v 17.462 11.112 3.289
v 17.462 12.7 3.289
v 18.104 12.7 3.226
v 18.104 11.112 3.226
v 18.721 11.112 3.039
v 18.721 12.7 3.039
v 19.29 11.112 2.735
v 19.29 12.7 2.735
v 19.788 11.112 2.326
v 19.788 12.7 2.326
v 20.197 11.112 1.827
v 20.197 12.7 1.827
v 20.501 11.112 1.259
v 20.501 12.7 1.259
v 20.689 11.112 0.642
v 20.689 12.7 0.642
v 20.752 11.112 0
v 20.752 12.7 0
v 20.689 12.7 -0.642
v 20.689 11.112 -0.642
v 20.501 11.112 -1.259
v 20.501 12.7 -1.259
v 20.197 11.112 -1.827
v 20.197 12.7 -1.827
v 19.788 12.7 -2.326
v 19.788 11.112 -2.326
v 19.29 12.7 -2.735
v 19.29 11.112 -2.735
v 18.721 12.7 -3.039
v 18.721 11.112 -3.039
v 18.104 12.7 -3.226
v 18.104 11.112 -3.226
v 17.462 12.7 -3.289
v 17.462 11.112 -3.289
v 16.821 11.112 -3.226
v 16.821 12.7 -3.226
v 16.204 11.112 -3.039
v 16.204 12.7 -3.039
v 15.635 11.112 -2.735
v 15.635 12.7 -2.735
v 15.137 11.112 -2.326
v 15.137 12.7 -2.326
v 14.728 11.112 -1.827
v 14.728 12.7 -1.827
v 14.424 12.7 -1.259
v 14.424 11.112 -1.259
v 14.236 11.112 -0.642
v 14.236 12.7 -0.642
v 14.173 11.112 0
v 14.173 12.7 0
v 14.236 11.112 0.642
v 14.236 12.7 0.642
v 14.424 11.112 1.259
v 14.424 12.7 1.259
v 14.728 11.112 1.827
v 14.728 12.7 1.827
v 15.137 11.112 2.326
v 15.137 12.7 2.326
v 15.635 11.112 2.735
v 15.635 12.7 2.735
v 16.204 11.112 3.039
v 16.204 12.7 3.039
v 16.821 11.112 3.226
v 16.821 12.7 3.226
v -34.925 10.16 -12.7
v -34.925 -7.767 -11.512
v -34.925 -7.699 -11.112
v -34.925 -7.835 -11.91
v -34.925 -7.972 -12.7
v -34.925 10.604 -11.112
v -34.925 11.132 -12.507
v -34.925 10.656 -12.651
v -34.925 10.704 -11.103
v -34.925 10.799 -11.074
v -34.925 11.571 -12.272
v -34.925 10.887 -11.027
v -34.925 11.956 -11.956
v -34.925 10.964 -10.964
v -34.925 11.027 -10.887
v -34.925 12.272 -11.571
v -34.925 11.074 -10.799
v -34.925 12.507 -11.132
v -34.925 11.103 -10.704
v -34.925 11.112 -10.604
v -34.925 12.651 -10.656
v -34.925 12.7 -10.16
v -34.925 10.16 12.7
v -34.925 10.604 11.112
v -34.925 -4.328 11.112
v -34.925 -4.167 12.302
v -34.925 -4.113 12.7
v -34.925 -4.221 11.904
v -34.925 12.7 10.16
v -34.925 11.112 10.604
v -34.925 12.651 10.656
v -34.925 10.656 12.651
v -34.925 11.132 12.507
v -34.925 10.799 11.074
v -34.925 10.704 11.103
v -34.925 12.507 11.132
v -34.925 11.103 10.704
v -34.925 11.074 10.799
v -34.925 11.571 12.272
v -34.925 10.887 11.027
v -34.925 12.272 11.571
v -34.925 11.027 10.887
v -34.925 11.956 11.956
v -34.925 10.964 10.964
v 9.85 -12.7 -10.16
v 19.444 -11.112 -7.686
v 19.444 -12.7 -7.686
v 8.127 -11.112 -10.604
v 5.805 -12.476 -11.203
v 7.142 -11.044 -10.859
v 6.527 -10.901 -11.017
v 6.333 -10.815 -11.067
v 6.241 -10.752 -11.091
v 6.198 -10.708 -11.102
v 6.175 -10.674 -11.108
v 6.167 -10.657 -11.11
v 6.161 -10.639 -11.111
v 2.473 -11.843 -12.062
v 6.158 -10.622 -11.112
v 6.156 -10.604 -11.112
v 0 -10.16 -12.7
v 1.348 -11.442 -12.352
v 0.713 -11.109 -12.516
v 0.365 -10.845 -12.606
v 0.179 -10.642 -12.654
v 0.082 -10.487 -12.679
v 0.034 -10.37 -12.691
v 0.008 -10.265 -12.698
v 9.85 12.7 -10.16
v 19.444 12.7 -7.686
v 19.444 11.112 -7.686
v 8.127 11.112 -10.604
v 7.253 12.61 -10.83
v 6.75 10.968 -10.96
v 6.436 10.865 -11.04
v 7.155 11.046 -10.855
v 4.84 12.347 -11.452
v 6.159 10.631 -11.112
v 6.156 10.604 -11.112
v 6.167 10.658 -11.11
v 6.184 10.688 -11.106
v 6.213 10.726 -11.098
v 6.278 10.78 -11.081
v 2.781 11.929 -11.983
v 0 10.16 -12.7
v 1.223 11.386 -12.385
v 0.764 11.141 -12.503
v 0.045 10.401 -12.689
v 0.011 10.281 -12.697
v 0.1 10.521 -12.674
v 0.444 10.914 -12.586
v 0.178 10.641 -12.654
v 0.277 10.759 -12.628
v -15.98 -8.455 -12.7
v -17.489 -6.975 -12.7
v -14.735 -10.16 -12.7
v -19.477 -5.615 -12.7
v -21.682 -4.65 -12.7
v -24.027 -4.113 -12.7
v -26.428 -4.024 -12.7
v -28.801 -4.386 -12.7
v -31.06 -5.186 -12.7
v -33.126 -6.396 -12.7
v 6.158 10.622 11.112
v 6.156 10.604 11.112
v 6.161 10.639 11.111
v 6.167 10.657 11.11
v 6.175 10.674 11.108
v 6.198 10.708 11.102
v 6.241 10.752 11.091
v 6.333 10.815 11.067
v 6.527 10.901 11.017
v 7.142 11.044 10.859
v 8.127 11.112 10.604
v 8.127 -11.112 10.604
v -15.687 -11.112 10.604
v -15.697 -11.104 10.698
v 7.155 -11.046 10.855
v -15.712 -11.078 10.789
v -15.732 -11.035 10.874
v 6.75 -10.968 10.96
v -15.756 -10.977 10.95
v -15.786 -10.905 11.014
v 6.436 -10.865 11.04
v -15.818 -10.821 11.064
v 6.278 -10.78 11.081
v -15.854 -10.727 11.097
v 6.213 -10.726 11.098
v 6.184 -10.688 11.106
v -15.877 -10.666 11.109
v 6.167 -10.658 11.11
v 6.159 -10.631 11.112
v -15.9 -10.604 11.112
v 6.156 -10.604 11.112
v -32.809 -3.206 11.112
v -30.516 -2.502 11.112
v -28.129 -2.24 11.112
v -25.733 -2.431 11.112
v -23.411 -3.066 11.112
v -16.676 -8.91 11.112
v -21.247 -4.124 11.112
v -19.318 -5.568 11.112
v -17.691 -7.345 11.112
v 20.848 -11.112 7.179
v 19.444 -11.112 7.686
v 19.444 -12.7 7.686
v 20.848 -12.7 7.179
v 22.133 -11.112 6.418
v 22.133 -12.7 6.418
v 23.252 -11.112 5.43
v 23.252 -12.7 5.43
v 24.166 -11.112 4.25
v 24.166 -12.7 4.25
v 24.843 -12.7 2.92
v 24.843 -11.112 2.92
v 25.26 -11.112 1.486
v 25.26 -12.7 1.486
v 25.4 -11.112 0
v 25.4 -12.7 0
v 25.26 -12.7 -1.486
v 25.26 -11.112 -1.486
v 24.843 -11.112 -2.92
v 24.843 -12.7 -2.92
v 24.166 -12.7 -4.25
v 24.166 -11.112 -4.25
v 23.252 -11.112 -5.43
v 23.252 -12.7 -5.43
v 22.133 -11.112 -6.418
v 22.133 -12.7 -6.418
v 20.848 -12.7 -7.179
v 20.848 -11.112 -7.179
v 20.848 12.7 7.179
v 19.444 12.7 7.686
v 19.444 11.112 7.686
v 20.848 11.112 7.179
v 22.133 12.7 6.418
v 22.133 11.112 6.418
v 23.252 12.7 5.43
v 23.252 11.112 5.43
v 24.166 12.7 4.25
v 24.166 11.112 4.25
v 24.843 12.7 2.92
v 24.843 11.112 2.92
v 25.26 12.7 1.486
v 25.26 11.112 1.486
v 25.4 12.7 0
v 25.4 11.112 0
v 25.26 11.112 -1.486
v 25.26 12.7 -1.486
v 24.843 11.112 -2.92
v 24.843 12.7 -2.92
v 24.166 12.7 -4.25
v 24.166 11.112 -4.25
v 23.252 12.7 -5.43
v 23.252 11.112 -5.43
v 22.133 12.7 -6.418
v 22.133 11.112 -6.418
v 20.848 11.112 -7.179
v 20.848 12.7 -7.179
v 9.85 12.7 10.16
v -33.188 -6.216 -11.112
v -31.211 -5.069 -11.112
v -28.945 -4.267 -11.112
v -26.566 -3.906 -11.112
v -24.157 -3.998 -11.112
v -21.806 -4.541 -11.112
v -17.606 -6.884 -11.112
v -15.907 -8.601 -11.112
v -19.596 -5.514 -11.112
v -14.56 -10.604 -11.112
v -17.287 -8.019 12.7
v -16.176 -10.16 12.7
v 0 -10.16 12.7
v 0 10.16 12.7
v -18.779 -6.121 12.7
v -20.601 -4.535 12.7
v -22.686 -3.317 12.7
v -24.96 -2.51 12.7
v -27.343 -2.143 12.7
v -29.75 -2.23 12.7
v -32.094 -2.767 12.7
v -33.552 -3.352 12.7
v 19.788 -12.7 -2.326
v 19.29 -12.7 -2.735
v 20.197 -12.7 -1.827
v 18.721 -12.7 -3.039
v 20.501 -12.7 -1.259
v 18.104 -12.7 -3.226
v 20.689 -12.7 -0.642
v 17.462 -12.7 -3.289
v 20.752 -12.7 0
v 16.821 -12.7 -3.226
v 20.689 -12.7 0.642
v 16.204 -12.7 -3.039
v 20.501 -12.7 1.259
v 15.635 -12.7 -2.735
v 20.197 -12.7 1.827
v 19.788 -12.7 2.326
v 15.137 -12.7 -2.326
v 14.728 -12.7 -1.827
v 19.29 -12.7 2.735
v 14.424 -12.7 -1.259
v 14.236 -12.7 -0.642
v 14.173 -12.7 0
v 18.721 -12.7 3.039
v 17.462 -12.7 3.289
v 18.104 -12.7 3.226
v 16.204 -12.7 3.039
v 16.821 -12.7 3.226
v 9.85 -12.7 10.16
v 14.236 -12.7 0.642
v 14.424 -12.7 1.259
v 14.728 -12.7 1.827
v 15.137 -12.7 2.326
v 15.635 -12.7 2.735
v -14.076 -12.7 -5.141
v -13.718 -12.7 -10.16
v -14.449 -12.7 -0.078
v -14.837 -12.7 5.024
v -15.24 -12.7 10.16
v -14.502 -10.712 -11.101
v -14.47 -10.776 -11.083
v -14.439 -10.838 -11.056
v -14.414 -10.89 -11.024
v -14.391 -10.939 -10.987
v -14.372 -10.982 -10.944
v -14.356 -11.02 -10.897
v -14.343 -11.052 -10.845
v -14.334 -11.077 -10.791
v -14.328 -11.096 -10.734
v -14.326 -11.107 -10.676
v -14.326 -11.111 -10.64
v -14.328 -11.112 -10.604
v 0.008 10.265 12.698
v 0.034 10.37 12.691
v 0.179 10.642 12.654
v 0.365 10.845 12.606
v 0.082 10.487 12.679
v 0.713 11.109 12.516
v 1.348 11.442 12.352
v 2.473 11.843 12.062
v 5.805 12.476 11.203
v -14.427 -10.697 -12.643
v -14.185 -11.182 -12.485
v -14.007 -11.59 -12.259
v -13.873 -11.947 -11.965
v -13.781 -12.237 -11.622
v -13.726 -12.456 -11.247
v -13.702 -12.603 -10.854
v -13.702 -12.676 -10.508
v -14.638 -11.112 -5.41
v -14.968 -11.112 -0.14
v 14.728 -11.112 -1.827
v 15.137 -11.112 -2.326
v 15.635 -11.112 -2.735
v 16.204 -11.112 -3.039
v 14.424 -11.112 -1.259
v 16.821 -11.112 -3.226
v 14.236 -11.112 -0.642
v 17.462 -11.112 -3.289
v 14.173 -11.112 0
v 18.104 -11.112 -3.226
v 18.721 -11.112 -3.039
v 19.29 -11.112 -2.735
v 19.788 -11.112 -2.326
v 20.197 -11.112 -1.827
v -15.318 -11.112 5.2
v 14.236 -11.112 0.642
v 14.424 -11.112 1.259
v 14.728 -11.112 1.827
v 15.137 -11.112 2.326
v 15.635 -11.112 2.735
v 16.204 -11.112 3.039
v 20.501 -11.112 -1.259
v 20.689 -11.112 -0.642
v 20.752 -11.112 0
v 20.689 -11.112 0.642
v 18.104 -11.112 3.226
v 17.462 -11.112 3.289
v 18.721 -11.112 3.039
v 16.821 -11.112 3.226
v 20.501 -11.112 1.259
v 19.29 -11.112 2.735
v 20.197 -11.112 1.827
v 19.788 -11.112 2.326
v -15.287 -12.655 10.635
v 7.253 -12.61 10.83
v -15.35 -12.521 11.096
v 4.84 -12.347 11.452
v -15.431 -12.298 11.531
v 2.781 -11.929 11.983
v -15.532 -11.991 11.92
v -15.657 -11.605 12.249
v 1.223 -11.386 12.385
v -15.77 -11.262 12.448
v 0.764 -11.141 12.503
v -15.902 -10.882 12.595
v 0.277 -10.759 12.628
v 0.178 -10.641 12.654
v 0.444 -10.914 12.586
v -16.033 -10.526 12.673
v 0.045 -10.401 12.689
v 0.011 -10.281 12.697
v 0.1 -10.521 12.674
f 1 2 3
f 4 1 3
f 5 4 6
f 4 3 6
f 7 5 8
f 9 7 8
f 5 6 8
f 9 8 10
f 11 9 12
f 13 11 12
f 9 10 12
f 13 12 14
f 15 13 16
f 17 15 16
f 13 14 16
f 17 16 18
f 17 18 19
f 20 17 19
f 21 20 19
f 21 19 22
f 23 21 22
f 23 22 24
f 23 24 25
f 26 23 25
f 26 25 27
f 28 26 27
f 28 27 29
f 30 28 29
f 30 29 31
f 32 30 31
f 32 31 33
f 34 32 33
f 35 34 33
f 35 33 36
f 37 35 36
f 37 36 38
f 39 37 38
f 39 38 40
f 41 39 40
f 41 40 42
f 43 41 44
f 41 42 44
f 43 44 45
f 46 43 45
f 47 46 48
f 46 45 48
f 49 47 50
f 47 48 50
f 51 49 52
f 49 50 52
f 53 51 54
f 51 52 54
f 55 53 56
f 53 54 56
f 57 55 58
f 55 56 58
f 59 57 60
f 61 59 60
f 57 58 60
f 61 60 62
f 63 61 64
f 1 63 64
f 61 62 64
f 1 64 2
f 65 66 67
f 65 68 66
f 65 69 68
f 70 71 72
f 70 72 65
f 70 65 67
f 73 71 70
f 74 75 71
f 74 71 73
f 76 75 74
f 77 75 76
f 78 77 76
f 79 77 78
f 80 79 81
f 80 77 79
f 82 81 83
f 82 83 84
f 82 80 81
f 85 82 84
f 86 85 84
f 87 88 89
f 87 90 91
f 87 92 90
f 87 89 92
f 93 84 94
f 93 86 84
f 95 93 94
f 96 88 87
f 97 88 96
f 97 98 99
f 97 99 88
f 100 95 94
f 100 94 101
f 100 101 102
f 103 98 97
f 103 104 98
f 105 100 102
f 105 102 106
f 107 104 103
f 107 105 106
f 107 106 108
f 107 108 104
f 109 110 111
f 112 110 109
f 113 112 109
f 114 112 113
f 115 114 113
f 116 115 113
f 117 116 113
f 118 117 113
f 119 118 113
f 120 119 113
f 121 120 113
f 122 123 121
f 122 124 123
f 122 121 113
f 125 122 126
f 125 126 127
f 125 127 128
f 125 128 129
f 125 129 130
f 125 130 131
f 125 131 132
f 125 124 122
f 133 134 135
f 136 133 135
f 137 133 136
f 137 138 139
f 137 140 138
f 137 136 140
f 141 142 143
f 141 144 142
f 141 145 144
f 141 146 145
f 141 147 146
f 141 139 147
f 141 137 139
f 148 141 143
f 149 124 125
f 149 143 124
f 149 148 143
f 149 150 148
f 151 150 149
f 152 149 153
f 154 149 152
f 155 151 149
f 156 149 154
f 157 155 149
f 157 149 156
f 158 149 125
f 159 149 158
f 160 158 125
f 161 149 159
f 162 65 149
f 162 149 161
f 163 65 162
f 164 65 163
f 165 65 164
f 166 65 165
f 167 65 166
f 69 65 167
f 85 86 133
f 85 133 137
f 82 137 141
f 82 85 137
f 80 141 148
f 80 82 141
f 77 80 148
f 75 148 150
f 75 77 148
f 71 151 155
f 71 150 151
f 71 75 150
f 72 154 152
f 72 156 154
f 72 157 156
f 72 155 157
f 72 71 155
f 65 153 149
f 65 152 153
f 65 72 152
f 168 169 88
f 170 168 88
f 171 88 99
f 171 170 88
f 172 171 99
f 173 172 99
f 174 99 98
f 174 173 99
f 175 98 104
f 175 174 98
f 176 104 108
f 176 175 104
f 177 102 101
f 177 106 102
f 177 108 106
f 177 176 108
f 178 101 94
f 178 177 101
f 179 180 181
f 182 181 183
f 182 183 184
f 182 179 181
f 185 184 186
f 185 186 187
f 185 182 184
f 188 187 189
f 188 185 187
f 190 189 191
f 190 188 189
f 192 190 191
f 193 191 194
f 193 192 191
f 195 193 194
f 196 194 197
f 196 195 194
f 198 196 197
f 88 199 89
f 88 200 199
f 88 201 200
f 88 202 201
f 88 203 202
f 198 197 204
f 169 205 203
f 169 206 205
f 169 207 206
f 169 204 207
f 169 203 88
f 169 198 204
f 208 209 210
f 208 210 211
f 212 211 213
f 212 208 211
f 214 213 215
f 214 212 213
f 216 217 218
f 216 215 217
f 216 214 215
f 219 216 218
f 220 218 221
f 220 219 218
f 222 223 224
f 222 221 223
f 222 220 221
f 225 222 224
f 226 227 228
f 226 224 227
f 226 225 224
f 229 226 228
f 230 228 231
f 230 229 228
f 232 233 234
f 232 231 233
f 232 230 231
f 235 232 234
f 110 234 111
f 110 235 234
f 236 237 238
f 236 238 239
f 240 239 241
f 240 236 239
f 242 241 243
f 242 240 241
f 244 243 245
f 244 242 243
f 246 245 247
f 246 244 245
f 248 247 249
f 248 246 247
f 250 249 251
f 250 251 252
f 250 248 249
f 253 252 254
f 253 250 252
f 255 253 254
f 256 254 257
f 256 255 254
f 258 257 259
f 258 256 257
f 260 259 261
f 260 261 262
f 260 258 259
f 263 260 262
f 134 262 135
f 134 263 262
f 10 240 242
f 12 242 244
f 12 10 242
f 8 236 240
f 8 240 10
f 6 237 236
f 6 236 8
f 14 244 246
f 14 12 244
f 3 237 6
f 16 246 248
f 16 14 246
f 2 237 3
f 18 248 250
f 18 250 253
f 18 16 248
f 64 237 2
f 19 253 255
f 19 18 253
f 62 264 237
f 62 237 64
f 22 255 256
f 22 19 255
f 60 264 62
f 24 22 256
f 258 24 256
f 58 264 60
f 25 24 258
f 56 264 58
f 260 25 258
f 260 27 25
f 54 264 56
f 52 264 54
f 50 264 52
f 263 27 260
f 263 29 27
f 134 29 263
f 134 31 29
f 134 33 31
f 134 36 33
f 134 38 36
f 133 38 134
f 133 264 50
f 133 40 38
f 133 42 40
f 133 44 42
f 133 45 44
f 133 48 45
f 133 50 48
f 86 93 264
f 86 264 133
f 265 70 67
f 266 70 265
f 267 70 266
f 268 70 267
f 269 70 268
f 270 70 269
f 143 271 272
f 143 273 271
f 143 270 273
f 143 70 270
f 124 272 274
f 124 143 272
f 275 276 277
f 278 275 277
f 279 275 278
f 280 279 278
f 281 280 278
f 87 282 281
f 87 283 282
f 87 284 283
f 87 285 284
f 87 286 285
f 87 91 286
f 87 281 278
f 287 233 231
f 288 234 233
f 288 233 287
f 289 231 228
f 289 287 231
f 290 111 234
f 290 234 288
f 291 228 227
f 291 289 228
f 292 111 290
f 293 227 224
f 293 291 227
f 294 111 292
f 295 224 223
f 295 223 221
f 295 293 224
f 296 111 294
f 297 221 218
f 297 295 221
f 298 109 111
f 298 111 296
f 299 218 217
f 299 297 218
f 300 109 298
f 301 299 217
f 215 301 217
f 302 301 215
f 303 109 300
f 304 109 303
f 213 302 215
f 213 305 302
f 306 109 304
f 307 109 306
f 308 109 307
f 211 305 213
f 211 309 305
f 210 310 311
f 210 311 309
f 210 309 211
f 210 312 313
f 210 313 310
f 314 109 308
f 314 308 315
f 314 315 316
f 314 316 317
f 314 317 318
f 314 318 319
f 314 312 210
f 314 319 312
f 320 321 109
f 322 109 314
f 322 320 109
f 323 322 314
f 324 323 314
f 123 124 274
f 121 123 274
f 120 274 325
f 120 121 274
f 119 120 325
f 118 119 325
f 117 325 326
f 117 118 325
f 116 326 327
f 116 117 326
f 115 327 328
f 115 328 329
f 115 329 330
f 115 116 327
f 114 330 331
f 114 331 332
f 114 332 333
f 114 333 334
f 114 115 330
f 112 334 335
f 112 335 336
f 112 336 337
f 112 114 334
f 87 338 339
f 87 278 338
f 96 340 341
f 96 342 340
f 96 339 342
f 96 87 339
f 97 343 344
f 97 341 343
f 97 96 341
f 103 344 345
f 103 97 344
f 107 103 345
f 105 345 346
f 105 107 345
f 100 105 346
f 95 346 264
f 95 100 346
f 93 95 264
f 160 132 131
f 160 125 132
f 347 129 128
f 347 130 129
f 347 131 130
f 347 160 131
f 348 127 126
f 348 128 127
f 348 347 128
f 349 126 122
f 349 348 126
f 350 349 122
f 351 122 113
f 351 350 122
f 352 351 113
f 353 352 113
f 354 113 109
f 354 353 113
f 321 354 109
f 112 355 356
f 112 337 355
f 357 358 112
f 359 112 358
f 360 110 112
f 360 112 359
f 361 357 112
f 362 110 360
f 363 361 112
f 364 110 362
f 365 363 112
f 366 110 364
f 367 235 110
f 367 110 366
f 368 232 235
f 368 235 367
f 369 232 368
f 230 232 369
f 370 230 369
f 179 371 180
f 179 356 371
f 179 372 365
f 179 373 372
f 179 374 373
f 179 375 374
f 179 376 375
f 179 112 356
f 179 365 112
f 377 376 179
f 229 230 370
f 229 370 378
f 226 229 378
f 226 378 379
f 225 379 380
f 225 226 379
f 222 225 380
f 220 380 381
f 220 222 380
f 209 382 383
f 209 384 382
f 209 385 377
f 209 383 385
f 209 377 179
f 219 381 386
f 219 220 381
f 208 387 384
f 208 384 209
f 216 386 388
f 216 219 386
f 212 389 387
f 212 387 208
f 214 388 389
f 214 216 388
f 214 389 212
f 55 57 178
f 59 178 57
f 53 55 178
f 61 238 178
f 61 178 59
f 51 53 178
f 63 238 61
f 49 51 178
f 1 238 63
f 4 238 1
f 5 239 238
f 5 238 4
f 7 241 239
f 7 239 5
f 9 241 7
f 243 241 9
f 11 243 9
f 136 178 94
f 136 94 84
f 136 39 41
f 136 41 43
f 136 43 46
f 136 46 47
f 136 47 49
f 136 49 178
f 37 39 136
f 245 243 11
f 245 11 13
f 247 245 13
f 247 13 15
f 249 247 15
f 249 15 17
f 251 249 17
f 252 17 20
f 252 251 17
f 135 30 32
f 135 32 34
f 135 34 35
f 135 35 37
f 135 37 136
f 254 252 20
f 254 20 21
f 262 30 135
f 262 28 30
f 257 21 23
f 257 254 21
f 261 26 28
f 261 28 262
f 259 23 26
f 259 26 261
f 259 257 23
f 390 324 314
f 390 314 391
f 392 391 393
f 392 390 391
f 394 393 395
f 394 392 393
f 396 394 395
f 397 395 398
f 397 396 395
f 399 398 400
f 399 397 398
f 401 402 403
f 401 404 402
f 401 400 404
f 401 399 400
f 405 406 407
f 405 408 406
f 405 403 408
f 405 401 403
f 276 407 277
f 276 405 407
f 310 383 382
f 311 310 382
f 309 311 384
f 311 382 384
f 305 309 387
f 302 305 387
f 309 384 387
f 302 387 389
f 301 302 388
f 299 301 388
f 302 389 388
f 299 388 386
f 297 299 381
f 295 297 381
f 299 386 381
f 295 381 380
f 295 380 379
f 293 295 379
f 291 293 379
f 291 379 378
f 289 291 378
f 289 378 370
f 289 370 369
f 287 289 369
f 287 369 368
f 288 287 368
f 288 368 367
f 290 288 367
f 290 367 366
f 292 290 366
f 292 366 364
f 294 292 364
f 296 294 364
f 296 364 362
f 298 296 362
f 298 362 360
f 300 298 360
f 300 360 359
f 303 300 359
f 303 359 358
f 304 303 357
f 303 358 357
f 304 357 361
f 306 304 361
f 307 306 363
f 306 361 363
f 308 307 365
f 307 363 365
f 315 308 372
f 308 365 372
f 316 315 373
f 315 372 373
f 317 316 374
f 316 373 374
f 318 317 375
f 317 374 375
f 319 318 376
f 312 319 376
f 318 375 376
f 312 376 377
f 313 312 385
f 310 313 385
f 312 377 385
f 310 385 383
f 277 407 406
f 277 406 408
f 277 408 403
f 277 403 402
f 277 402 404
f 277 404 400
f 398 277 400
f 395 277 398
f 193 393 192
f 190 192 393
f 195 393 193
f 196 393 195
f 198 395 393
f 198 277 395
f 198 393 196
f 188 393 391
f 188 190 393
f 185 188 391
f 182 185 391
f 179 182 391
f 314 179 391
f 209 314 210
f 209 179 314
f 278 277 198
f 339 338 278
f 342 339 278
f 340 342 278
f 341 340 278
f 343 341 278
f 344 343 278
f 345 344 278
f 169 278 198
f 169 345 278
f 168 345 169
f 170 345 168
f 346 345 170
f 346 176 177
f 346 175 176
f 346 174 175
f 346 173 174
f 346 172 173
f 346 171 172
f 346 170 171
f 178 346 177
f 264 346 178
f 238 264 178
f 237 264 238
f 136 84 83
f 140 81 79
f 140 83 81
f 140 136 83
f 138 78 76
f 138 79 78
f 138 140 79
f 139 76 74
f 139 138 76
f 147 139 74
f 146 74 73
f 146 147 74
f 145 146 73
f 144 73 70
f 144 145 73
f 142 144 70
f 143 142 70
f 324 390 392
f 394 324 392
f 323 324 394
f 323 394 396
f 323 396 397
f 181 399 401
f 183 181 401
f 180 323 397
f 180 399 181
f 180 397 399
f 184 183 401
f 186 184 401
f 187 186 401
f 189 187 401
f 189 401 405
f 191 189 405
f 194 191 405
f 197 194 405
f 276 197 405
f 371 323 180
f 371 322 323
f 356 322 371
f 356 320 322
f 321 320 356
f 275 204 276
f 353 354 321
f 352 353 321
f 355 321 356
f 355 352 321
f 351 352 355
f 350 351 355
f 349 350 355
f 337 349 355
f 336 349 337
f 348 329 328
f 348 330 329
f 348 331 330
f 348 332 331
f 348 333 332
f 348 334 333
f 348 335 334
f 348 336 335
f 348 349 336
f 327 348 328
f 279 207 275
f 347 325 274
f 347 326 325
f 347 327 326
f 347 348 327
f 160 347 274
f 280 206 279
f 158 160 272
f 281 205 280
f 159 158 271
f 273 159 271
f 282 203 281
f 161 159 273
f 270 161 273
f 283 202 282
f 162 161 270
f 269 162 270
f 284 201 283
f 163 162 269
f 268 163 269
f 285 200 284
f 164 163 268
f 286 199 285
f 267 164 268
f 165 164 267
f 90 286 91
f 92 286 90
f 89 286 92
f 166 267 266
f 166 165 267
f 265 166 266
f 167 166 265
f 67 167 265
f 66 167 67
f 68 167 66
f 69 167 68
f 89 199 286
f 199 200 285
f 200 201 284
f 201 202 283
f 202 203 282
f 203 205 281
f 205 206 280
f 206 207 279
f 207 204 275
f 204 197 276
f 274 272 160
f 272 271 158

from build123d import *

# Parameters (mm, degrees)
BOSS_EXTRUDE1_DEPTH      = 25.4
BOSS_EXTRUDE1_DEPTH_BACK = 34.925
CUT_EXTRUDE4_DEPTH       = 63.941922635
CUT_EXTRUDE5_DEPTH       = 46.01339384
SKETCH14_R               = 3.2893
CUT_EXTRUDE6_DEPTH       = 46.01339384
CUT_EXTRUDE7_DEPTH       = 12.7
CUT_EXTRUDE7_DEPTH_BACK  = 38.1
SKETCH15_R               = 12.7


with BuildPart() as part:
    # Sketch1 → Boss-Extrude1 (new, two sides: drawn at the far end of the back side and taken through both)
    with BuildSketch(Plane(origin=(0, 0, 0), x_dir=(0, 0, -1), z_dir=(1, 0, 0)).offset(-BOSS_EXTRUDE1_DEPTH_BACK)):
        with BuildLine():
            Line((-10.16, 12.7), (10.16, 12.7))
            ThreePointArc((10.16, 12.7), (11.956051224, 11.956051224), (12.7, 10.16))
            Line((12.7, 10.16), (12.7, -10.16))
            ThreePointArc((12.7, -10.16), (11.956051224, -11.956051224), (10.16, -12.7))
            Line((10.16, -12.7), (-10.16, -12.7))
            ThreePointArc((-10.16, -12.7), (-11.956051224, -11.956051224), (-12.7, -10.16))
            Line((-12.7, -10.16), (-12.7, 10.16))
            ThreePointArc((-12.7, 10.16), (-11.956051224, 11.956051224), (-10.16, 12.7))
        make_face()
    extrude(amount=BOSS_EXTRUDE1_DEPTH + BOSS_EXTRUDE1_DEPTH_BACK)

    # Sketch11 → Cut-Extrude4 (cut, through all)
    with BuildSketch(Plane(origin=(25.4, 0, 0), x_dir=(0, 0, -1), z_dir=(1, 0, 0))):
        with BuildLine():
            Line((-10.6045, 11.1125), (10.6045, 11.1125))
            ThreePointArc((10.6045, 11.1125), (10.963710245, 10.963710245), (11.1125, 10.6045))
            Line((11.1125, 10.6045), (11.1125, -10.6045))
            ThreePointArc((11.1125, -10.6045), (10.963710245, -10.963710245), (10.6045, -11.1125))
            Line((10.6045, -11.1125), (-10.6045, -11.1125))
            ThreePointArc((-10.6045, -11.1125), (-10.963710245, -10.963710245), (-11.1125, -10.6045))
            Line((-11.1125, -10.6045), (-11.1125, 10.6045))
            ThreePointArc((-11.1125, 10.6045), (-10.963710245, 10.963710245), (-10.6045, 11.1125))
        make_face()
    extrude(amount=-CUT_EXTRUDE4_DEPTH, mode=Mode.SUBTRACT)

    # Sketch12 → Cut-Extrude5 (cut, through all)
    with BuildSketch(Plane(origin=(0, 12.7, 0), x_dir=(1, 0, 0), z_dir=(0, 1, 0))):
        with BuildLine():
            Line((50.8, 12.7), (0, 12.7))
            Line((0, 12.7), (19.444424463, 7.686083637))
            ThreePointArc((19.444424463, 7.686083637), (25.4, 0), (19.444424463, -7.686083637))
            Line((19.444424463, -7.686083637), (0, -12.7))
            Line((0, -12.7), (50.8, -12.7))
            Line((50.8, -12.7), (50.8, 12.7))
        make_face()
    extrude(amount=-CUT_EXTRUDE5_DEPTH, mode=Mode.SUBTRACT)

    # Sketch14 → Cut-Extrude6 (cut, through all)
    with BuildSketch(Plane(origin=(0, 12.7, 0), x_dir=(1, 0, 0), z_dir=(0, 1, 0))):
        with Locations((17.4625, 0)):
            Circle(SKETCH14_R)
    extrude(amount=-CUT_EXTRUDE6_DEPTH, mode=Mode.SUBTRACT)

    # Sketch15 → Cut-Extrude7 (cut, two sides: drawn at the far end of the back side and taken through both)
    with BuildSketch(Plane(origin=(-28.000601556, -14.856223036, 12.7), x_dir=(0.9956294808615993, 0.00690045849591187, 0.09313603229582208), z_dir=(-0.09339131029845452, 0.0735646591533628, 0.9929080038374085)).offset(-CUT_EXTRUDE7_DEPTH_BACK)):
        Circle(SKETCH15_R)
    extrude(amount=CUT_EXTRUDE7_DEPTH + CUT_EXTRUDE7_DEPTH_BACK, mode=Mode.SUBTRACT)


solid = part.part
